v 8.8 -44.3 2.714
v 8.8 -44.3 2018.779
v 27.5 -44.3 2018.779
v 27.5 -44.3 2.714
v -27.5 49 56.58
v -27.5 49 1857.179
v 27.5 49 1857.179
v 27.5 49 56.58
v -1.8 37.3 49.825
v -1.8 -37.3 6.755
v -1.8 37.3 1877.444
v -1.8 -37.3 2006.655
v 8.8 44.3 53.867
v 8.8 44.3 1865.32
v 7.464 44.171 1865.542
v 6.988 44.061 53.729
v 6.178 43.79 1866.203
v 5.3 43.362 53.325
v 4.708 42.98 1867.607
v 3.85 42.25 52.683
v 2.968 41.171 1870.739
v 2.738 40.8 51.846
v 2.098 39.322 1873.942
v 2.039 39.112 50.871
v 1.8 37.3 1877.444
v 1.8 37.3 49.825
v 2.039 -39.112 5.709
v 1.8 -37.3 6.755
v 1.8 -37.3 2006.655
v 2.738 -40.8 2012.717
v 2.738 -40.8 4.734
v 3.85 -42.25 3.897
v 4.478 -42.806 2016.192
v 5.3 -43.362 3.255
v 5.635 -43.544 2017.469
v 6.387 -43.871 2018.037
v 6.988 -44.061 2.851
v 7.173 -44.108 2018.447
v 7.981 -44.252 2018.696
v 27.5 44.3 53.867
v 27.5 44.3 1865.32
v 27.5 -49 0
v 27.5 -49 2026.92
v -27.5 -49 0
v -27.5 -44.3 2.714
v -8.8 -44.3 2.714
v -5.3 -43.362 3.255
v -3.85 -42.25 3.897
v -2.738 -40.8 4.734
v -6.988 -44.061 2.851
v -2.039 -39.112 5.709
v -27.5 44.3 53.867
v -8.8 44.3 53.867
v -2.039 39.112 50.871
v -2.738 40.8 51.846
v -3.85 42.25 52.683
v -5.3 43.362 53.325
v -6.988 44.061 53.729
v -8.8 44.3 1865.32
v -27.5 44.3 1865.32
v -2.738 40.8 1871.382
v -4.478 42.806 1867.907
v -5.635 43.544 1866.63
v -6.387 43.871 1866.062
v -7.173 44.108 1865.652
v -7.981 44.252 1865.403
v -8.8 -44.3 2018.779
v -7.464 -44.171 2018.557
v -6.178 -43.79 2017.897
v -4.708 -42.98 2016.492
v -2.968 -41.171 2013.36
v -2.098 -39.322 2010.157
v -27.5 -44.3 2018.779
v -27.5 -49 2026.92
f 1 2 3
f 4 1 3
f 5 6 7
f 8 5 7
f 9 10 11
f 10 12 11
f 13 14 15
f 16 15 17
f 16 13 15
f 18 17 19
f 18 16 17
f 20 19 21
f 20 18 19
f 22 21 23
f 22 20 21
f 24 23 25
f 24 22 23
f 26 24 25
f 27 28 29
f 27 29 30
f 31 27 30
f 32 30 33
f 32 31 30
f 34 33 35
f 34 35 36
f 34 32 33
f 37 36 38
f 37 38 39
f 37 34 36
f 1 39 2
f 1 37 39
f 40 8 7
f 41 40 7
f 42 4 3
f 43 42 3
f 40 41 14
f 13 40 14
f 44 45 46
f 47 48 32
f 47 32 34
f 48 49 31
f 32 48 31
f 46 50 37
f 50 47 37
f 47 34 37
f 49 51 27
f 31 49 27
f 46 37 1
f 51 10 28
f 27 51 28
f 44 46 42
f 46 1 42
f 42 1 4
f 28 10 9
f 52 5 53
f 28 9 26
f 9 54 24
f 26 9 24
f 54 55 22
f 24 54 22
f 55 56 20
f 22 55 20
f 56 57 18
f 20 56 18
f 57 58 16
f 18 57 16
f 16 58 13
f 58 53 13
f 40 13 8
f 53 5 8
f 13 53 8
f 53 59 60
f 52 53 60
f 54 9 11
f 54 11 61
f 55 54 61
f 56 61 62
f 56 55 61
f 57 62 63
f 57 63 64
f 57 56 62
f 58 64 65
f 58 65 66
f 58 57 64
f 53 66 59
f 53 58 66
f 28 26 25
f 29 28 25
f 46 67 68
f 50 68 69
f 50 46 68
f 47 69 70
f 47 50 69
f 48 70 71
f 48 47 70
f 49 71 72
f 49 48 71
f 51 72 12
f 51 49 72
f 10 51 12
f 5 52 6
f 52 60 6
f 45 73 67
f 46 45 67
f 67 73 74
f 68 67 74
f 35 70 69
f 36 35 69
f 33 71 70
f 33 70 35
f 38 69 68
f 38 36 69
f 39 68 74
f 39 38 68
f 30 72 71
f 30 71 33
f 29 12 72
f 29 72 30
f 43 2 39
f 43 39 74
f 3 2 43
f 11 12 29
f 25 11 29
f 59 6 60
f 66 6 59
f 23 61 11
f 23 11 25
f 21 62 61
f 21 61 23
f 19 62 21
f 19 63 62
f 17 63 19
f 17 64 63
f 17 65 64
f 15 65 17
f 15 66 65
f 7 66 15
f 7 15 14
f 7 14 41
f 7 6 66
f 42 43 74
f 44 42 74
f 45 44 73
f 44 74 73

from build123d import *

# Parameters (mm, degrees)
BOSS_EXTRUDE1_DEPTH     = 2032
SKETCH2_W               = 211.702458594
SKETCH2_H               = 483.586926944
CUT_EXTRUDE1_DEPTH      = 50
SKETCH3_W               = 200.611820878
SKETCH3_H               = 857.421683483
CUT_EXTRUDE3_DEPTH      = 85.870489571
CUT_EXTRUDE3_DEPTH_BACK = 2.54


with BuildPart() as part:
    # Sketch1 → Boss-Extrude1 (new body)
    with BuildSketch(Plane.XY):
        with BuildLine():
            Line((-27.5, 49), (27.5, 49))
            Line((27.5, 49), (27.5, 44.3))
            Line((27.5, 44.3), (8.8, 44.3))
            ThreePointArc((8.8, 44.3), (3.850252532, 42.249747468), (1.8, 37.3))
            Line((1.8, 37.3), (1.8, -37.3))
            ThreePointArc((1.8, -37.3), (3.850252532, -42.249747468), (8.8, -44.3))
            Line((8.8, -44.3), (27.5, -44.3))
            Line((27.5, -44.3), (27.5, -49))
            Line((27.5, -49), (-27.5, -49))
            Line((-27.5, -49), (-27.5, -44.3))
            Line((-27.5, -44.3), (-8.8, -44.3))
            ThreePointArc((-8.8, -44.3), (-3.850252532, -42.249747468), (-1.8, -37.3))
            Line((-1.8, -37.3), (-1.8, 37.3))
            ThreePointArc((-1.8, 37.3), (-3.850252532, 42.249747468), (-8.8, 44.3))
            Line((-8.8, 44.3), (-27.5, 44.3))
            Line((-27.5, 44.3), (-27.5, 49))
        make_face()
    extrude(amount=BOSS_EXTRUDE1_DEPTH)

    # Sketch2 → Cut-Extrude1 (cut, through all)
    with BuildSketch(Plane(origin=(0, -12.25, 21.217622393), x_dir=(1, 0, 0), z_dir=(0, -0.5, 0.866025404))):
        with Locations((0, 13.030857736)):
            Rectangle(SKETCH2_W, SKETCH2_H)
    extrude(amount=-CUT_EXTRUDE1_DEPTH, mode=Mode.SUBTRACT)

    # Sketch3 → Cut-Extrude3 (cut, two sides)
    with BuildSketch(Plane(origin=(0, 843.131810245, 486.782377607), x_dir=(1, 0, 0), z_dir=(0, 0.866025404, 0.5))) as cut_extrude3_sk:
        with Locations((6.979656851, -1512.870182956)):
            Rectangle(SKETCH3_W, SKETCH3_H)
    extrude(amount=CUT_EXTRUDE3_DEPTH, mode=Mode.SUBTRACT)
    extrude(cut_extrude3_sk.sketch, amount=-CUT_EXTRUDE3_DEPTH_BACK, mode=Mode.SUBTRACT)


solid = part.part
